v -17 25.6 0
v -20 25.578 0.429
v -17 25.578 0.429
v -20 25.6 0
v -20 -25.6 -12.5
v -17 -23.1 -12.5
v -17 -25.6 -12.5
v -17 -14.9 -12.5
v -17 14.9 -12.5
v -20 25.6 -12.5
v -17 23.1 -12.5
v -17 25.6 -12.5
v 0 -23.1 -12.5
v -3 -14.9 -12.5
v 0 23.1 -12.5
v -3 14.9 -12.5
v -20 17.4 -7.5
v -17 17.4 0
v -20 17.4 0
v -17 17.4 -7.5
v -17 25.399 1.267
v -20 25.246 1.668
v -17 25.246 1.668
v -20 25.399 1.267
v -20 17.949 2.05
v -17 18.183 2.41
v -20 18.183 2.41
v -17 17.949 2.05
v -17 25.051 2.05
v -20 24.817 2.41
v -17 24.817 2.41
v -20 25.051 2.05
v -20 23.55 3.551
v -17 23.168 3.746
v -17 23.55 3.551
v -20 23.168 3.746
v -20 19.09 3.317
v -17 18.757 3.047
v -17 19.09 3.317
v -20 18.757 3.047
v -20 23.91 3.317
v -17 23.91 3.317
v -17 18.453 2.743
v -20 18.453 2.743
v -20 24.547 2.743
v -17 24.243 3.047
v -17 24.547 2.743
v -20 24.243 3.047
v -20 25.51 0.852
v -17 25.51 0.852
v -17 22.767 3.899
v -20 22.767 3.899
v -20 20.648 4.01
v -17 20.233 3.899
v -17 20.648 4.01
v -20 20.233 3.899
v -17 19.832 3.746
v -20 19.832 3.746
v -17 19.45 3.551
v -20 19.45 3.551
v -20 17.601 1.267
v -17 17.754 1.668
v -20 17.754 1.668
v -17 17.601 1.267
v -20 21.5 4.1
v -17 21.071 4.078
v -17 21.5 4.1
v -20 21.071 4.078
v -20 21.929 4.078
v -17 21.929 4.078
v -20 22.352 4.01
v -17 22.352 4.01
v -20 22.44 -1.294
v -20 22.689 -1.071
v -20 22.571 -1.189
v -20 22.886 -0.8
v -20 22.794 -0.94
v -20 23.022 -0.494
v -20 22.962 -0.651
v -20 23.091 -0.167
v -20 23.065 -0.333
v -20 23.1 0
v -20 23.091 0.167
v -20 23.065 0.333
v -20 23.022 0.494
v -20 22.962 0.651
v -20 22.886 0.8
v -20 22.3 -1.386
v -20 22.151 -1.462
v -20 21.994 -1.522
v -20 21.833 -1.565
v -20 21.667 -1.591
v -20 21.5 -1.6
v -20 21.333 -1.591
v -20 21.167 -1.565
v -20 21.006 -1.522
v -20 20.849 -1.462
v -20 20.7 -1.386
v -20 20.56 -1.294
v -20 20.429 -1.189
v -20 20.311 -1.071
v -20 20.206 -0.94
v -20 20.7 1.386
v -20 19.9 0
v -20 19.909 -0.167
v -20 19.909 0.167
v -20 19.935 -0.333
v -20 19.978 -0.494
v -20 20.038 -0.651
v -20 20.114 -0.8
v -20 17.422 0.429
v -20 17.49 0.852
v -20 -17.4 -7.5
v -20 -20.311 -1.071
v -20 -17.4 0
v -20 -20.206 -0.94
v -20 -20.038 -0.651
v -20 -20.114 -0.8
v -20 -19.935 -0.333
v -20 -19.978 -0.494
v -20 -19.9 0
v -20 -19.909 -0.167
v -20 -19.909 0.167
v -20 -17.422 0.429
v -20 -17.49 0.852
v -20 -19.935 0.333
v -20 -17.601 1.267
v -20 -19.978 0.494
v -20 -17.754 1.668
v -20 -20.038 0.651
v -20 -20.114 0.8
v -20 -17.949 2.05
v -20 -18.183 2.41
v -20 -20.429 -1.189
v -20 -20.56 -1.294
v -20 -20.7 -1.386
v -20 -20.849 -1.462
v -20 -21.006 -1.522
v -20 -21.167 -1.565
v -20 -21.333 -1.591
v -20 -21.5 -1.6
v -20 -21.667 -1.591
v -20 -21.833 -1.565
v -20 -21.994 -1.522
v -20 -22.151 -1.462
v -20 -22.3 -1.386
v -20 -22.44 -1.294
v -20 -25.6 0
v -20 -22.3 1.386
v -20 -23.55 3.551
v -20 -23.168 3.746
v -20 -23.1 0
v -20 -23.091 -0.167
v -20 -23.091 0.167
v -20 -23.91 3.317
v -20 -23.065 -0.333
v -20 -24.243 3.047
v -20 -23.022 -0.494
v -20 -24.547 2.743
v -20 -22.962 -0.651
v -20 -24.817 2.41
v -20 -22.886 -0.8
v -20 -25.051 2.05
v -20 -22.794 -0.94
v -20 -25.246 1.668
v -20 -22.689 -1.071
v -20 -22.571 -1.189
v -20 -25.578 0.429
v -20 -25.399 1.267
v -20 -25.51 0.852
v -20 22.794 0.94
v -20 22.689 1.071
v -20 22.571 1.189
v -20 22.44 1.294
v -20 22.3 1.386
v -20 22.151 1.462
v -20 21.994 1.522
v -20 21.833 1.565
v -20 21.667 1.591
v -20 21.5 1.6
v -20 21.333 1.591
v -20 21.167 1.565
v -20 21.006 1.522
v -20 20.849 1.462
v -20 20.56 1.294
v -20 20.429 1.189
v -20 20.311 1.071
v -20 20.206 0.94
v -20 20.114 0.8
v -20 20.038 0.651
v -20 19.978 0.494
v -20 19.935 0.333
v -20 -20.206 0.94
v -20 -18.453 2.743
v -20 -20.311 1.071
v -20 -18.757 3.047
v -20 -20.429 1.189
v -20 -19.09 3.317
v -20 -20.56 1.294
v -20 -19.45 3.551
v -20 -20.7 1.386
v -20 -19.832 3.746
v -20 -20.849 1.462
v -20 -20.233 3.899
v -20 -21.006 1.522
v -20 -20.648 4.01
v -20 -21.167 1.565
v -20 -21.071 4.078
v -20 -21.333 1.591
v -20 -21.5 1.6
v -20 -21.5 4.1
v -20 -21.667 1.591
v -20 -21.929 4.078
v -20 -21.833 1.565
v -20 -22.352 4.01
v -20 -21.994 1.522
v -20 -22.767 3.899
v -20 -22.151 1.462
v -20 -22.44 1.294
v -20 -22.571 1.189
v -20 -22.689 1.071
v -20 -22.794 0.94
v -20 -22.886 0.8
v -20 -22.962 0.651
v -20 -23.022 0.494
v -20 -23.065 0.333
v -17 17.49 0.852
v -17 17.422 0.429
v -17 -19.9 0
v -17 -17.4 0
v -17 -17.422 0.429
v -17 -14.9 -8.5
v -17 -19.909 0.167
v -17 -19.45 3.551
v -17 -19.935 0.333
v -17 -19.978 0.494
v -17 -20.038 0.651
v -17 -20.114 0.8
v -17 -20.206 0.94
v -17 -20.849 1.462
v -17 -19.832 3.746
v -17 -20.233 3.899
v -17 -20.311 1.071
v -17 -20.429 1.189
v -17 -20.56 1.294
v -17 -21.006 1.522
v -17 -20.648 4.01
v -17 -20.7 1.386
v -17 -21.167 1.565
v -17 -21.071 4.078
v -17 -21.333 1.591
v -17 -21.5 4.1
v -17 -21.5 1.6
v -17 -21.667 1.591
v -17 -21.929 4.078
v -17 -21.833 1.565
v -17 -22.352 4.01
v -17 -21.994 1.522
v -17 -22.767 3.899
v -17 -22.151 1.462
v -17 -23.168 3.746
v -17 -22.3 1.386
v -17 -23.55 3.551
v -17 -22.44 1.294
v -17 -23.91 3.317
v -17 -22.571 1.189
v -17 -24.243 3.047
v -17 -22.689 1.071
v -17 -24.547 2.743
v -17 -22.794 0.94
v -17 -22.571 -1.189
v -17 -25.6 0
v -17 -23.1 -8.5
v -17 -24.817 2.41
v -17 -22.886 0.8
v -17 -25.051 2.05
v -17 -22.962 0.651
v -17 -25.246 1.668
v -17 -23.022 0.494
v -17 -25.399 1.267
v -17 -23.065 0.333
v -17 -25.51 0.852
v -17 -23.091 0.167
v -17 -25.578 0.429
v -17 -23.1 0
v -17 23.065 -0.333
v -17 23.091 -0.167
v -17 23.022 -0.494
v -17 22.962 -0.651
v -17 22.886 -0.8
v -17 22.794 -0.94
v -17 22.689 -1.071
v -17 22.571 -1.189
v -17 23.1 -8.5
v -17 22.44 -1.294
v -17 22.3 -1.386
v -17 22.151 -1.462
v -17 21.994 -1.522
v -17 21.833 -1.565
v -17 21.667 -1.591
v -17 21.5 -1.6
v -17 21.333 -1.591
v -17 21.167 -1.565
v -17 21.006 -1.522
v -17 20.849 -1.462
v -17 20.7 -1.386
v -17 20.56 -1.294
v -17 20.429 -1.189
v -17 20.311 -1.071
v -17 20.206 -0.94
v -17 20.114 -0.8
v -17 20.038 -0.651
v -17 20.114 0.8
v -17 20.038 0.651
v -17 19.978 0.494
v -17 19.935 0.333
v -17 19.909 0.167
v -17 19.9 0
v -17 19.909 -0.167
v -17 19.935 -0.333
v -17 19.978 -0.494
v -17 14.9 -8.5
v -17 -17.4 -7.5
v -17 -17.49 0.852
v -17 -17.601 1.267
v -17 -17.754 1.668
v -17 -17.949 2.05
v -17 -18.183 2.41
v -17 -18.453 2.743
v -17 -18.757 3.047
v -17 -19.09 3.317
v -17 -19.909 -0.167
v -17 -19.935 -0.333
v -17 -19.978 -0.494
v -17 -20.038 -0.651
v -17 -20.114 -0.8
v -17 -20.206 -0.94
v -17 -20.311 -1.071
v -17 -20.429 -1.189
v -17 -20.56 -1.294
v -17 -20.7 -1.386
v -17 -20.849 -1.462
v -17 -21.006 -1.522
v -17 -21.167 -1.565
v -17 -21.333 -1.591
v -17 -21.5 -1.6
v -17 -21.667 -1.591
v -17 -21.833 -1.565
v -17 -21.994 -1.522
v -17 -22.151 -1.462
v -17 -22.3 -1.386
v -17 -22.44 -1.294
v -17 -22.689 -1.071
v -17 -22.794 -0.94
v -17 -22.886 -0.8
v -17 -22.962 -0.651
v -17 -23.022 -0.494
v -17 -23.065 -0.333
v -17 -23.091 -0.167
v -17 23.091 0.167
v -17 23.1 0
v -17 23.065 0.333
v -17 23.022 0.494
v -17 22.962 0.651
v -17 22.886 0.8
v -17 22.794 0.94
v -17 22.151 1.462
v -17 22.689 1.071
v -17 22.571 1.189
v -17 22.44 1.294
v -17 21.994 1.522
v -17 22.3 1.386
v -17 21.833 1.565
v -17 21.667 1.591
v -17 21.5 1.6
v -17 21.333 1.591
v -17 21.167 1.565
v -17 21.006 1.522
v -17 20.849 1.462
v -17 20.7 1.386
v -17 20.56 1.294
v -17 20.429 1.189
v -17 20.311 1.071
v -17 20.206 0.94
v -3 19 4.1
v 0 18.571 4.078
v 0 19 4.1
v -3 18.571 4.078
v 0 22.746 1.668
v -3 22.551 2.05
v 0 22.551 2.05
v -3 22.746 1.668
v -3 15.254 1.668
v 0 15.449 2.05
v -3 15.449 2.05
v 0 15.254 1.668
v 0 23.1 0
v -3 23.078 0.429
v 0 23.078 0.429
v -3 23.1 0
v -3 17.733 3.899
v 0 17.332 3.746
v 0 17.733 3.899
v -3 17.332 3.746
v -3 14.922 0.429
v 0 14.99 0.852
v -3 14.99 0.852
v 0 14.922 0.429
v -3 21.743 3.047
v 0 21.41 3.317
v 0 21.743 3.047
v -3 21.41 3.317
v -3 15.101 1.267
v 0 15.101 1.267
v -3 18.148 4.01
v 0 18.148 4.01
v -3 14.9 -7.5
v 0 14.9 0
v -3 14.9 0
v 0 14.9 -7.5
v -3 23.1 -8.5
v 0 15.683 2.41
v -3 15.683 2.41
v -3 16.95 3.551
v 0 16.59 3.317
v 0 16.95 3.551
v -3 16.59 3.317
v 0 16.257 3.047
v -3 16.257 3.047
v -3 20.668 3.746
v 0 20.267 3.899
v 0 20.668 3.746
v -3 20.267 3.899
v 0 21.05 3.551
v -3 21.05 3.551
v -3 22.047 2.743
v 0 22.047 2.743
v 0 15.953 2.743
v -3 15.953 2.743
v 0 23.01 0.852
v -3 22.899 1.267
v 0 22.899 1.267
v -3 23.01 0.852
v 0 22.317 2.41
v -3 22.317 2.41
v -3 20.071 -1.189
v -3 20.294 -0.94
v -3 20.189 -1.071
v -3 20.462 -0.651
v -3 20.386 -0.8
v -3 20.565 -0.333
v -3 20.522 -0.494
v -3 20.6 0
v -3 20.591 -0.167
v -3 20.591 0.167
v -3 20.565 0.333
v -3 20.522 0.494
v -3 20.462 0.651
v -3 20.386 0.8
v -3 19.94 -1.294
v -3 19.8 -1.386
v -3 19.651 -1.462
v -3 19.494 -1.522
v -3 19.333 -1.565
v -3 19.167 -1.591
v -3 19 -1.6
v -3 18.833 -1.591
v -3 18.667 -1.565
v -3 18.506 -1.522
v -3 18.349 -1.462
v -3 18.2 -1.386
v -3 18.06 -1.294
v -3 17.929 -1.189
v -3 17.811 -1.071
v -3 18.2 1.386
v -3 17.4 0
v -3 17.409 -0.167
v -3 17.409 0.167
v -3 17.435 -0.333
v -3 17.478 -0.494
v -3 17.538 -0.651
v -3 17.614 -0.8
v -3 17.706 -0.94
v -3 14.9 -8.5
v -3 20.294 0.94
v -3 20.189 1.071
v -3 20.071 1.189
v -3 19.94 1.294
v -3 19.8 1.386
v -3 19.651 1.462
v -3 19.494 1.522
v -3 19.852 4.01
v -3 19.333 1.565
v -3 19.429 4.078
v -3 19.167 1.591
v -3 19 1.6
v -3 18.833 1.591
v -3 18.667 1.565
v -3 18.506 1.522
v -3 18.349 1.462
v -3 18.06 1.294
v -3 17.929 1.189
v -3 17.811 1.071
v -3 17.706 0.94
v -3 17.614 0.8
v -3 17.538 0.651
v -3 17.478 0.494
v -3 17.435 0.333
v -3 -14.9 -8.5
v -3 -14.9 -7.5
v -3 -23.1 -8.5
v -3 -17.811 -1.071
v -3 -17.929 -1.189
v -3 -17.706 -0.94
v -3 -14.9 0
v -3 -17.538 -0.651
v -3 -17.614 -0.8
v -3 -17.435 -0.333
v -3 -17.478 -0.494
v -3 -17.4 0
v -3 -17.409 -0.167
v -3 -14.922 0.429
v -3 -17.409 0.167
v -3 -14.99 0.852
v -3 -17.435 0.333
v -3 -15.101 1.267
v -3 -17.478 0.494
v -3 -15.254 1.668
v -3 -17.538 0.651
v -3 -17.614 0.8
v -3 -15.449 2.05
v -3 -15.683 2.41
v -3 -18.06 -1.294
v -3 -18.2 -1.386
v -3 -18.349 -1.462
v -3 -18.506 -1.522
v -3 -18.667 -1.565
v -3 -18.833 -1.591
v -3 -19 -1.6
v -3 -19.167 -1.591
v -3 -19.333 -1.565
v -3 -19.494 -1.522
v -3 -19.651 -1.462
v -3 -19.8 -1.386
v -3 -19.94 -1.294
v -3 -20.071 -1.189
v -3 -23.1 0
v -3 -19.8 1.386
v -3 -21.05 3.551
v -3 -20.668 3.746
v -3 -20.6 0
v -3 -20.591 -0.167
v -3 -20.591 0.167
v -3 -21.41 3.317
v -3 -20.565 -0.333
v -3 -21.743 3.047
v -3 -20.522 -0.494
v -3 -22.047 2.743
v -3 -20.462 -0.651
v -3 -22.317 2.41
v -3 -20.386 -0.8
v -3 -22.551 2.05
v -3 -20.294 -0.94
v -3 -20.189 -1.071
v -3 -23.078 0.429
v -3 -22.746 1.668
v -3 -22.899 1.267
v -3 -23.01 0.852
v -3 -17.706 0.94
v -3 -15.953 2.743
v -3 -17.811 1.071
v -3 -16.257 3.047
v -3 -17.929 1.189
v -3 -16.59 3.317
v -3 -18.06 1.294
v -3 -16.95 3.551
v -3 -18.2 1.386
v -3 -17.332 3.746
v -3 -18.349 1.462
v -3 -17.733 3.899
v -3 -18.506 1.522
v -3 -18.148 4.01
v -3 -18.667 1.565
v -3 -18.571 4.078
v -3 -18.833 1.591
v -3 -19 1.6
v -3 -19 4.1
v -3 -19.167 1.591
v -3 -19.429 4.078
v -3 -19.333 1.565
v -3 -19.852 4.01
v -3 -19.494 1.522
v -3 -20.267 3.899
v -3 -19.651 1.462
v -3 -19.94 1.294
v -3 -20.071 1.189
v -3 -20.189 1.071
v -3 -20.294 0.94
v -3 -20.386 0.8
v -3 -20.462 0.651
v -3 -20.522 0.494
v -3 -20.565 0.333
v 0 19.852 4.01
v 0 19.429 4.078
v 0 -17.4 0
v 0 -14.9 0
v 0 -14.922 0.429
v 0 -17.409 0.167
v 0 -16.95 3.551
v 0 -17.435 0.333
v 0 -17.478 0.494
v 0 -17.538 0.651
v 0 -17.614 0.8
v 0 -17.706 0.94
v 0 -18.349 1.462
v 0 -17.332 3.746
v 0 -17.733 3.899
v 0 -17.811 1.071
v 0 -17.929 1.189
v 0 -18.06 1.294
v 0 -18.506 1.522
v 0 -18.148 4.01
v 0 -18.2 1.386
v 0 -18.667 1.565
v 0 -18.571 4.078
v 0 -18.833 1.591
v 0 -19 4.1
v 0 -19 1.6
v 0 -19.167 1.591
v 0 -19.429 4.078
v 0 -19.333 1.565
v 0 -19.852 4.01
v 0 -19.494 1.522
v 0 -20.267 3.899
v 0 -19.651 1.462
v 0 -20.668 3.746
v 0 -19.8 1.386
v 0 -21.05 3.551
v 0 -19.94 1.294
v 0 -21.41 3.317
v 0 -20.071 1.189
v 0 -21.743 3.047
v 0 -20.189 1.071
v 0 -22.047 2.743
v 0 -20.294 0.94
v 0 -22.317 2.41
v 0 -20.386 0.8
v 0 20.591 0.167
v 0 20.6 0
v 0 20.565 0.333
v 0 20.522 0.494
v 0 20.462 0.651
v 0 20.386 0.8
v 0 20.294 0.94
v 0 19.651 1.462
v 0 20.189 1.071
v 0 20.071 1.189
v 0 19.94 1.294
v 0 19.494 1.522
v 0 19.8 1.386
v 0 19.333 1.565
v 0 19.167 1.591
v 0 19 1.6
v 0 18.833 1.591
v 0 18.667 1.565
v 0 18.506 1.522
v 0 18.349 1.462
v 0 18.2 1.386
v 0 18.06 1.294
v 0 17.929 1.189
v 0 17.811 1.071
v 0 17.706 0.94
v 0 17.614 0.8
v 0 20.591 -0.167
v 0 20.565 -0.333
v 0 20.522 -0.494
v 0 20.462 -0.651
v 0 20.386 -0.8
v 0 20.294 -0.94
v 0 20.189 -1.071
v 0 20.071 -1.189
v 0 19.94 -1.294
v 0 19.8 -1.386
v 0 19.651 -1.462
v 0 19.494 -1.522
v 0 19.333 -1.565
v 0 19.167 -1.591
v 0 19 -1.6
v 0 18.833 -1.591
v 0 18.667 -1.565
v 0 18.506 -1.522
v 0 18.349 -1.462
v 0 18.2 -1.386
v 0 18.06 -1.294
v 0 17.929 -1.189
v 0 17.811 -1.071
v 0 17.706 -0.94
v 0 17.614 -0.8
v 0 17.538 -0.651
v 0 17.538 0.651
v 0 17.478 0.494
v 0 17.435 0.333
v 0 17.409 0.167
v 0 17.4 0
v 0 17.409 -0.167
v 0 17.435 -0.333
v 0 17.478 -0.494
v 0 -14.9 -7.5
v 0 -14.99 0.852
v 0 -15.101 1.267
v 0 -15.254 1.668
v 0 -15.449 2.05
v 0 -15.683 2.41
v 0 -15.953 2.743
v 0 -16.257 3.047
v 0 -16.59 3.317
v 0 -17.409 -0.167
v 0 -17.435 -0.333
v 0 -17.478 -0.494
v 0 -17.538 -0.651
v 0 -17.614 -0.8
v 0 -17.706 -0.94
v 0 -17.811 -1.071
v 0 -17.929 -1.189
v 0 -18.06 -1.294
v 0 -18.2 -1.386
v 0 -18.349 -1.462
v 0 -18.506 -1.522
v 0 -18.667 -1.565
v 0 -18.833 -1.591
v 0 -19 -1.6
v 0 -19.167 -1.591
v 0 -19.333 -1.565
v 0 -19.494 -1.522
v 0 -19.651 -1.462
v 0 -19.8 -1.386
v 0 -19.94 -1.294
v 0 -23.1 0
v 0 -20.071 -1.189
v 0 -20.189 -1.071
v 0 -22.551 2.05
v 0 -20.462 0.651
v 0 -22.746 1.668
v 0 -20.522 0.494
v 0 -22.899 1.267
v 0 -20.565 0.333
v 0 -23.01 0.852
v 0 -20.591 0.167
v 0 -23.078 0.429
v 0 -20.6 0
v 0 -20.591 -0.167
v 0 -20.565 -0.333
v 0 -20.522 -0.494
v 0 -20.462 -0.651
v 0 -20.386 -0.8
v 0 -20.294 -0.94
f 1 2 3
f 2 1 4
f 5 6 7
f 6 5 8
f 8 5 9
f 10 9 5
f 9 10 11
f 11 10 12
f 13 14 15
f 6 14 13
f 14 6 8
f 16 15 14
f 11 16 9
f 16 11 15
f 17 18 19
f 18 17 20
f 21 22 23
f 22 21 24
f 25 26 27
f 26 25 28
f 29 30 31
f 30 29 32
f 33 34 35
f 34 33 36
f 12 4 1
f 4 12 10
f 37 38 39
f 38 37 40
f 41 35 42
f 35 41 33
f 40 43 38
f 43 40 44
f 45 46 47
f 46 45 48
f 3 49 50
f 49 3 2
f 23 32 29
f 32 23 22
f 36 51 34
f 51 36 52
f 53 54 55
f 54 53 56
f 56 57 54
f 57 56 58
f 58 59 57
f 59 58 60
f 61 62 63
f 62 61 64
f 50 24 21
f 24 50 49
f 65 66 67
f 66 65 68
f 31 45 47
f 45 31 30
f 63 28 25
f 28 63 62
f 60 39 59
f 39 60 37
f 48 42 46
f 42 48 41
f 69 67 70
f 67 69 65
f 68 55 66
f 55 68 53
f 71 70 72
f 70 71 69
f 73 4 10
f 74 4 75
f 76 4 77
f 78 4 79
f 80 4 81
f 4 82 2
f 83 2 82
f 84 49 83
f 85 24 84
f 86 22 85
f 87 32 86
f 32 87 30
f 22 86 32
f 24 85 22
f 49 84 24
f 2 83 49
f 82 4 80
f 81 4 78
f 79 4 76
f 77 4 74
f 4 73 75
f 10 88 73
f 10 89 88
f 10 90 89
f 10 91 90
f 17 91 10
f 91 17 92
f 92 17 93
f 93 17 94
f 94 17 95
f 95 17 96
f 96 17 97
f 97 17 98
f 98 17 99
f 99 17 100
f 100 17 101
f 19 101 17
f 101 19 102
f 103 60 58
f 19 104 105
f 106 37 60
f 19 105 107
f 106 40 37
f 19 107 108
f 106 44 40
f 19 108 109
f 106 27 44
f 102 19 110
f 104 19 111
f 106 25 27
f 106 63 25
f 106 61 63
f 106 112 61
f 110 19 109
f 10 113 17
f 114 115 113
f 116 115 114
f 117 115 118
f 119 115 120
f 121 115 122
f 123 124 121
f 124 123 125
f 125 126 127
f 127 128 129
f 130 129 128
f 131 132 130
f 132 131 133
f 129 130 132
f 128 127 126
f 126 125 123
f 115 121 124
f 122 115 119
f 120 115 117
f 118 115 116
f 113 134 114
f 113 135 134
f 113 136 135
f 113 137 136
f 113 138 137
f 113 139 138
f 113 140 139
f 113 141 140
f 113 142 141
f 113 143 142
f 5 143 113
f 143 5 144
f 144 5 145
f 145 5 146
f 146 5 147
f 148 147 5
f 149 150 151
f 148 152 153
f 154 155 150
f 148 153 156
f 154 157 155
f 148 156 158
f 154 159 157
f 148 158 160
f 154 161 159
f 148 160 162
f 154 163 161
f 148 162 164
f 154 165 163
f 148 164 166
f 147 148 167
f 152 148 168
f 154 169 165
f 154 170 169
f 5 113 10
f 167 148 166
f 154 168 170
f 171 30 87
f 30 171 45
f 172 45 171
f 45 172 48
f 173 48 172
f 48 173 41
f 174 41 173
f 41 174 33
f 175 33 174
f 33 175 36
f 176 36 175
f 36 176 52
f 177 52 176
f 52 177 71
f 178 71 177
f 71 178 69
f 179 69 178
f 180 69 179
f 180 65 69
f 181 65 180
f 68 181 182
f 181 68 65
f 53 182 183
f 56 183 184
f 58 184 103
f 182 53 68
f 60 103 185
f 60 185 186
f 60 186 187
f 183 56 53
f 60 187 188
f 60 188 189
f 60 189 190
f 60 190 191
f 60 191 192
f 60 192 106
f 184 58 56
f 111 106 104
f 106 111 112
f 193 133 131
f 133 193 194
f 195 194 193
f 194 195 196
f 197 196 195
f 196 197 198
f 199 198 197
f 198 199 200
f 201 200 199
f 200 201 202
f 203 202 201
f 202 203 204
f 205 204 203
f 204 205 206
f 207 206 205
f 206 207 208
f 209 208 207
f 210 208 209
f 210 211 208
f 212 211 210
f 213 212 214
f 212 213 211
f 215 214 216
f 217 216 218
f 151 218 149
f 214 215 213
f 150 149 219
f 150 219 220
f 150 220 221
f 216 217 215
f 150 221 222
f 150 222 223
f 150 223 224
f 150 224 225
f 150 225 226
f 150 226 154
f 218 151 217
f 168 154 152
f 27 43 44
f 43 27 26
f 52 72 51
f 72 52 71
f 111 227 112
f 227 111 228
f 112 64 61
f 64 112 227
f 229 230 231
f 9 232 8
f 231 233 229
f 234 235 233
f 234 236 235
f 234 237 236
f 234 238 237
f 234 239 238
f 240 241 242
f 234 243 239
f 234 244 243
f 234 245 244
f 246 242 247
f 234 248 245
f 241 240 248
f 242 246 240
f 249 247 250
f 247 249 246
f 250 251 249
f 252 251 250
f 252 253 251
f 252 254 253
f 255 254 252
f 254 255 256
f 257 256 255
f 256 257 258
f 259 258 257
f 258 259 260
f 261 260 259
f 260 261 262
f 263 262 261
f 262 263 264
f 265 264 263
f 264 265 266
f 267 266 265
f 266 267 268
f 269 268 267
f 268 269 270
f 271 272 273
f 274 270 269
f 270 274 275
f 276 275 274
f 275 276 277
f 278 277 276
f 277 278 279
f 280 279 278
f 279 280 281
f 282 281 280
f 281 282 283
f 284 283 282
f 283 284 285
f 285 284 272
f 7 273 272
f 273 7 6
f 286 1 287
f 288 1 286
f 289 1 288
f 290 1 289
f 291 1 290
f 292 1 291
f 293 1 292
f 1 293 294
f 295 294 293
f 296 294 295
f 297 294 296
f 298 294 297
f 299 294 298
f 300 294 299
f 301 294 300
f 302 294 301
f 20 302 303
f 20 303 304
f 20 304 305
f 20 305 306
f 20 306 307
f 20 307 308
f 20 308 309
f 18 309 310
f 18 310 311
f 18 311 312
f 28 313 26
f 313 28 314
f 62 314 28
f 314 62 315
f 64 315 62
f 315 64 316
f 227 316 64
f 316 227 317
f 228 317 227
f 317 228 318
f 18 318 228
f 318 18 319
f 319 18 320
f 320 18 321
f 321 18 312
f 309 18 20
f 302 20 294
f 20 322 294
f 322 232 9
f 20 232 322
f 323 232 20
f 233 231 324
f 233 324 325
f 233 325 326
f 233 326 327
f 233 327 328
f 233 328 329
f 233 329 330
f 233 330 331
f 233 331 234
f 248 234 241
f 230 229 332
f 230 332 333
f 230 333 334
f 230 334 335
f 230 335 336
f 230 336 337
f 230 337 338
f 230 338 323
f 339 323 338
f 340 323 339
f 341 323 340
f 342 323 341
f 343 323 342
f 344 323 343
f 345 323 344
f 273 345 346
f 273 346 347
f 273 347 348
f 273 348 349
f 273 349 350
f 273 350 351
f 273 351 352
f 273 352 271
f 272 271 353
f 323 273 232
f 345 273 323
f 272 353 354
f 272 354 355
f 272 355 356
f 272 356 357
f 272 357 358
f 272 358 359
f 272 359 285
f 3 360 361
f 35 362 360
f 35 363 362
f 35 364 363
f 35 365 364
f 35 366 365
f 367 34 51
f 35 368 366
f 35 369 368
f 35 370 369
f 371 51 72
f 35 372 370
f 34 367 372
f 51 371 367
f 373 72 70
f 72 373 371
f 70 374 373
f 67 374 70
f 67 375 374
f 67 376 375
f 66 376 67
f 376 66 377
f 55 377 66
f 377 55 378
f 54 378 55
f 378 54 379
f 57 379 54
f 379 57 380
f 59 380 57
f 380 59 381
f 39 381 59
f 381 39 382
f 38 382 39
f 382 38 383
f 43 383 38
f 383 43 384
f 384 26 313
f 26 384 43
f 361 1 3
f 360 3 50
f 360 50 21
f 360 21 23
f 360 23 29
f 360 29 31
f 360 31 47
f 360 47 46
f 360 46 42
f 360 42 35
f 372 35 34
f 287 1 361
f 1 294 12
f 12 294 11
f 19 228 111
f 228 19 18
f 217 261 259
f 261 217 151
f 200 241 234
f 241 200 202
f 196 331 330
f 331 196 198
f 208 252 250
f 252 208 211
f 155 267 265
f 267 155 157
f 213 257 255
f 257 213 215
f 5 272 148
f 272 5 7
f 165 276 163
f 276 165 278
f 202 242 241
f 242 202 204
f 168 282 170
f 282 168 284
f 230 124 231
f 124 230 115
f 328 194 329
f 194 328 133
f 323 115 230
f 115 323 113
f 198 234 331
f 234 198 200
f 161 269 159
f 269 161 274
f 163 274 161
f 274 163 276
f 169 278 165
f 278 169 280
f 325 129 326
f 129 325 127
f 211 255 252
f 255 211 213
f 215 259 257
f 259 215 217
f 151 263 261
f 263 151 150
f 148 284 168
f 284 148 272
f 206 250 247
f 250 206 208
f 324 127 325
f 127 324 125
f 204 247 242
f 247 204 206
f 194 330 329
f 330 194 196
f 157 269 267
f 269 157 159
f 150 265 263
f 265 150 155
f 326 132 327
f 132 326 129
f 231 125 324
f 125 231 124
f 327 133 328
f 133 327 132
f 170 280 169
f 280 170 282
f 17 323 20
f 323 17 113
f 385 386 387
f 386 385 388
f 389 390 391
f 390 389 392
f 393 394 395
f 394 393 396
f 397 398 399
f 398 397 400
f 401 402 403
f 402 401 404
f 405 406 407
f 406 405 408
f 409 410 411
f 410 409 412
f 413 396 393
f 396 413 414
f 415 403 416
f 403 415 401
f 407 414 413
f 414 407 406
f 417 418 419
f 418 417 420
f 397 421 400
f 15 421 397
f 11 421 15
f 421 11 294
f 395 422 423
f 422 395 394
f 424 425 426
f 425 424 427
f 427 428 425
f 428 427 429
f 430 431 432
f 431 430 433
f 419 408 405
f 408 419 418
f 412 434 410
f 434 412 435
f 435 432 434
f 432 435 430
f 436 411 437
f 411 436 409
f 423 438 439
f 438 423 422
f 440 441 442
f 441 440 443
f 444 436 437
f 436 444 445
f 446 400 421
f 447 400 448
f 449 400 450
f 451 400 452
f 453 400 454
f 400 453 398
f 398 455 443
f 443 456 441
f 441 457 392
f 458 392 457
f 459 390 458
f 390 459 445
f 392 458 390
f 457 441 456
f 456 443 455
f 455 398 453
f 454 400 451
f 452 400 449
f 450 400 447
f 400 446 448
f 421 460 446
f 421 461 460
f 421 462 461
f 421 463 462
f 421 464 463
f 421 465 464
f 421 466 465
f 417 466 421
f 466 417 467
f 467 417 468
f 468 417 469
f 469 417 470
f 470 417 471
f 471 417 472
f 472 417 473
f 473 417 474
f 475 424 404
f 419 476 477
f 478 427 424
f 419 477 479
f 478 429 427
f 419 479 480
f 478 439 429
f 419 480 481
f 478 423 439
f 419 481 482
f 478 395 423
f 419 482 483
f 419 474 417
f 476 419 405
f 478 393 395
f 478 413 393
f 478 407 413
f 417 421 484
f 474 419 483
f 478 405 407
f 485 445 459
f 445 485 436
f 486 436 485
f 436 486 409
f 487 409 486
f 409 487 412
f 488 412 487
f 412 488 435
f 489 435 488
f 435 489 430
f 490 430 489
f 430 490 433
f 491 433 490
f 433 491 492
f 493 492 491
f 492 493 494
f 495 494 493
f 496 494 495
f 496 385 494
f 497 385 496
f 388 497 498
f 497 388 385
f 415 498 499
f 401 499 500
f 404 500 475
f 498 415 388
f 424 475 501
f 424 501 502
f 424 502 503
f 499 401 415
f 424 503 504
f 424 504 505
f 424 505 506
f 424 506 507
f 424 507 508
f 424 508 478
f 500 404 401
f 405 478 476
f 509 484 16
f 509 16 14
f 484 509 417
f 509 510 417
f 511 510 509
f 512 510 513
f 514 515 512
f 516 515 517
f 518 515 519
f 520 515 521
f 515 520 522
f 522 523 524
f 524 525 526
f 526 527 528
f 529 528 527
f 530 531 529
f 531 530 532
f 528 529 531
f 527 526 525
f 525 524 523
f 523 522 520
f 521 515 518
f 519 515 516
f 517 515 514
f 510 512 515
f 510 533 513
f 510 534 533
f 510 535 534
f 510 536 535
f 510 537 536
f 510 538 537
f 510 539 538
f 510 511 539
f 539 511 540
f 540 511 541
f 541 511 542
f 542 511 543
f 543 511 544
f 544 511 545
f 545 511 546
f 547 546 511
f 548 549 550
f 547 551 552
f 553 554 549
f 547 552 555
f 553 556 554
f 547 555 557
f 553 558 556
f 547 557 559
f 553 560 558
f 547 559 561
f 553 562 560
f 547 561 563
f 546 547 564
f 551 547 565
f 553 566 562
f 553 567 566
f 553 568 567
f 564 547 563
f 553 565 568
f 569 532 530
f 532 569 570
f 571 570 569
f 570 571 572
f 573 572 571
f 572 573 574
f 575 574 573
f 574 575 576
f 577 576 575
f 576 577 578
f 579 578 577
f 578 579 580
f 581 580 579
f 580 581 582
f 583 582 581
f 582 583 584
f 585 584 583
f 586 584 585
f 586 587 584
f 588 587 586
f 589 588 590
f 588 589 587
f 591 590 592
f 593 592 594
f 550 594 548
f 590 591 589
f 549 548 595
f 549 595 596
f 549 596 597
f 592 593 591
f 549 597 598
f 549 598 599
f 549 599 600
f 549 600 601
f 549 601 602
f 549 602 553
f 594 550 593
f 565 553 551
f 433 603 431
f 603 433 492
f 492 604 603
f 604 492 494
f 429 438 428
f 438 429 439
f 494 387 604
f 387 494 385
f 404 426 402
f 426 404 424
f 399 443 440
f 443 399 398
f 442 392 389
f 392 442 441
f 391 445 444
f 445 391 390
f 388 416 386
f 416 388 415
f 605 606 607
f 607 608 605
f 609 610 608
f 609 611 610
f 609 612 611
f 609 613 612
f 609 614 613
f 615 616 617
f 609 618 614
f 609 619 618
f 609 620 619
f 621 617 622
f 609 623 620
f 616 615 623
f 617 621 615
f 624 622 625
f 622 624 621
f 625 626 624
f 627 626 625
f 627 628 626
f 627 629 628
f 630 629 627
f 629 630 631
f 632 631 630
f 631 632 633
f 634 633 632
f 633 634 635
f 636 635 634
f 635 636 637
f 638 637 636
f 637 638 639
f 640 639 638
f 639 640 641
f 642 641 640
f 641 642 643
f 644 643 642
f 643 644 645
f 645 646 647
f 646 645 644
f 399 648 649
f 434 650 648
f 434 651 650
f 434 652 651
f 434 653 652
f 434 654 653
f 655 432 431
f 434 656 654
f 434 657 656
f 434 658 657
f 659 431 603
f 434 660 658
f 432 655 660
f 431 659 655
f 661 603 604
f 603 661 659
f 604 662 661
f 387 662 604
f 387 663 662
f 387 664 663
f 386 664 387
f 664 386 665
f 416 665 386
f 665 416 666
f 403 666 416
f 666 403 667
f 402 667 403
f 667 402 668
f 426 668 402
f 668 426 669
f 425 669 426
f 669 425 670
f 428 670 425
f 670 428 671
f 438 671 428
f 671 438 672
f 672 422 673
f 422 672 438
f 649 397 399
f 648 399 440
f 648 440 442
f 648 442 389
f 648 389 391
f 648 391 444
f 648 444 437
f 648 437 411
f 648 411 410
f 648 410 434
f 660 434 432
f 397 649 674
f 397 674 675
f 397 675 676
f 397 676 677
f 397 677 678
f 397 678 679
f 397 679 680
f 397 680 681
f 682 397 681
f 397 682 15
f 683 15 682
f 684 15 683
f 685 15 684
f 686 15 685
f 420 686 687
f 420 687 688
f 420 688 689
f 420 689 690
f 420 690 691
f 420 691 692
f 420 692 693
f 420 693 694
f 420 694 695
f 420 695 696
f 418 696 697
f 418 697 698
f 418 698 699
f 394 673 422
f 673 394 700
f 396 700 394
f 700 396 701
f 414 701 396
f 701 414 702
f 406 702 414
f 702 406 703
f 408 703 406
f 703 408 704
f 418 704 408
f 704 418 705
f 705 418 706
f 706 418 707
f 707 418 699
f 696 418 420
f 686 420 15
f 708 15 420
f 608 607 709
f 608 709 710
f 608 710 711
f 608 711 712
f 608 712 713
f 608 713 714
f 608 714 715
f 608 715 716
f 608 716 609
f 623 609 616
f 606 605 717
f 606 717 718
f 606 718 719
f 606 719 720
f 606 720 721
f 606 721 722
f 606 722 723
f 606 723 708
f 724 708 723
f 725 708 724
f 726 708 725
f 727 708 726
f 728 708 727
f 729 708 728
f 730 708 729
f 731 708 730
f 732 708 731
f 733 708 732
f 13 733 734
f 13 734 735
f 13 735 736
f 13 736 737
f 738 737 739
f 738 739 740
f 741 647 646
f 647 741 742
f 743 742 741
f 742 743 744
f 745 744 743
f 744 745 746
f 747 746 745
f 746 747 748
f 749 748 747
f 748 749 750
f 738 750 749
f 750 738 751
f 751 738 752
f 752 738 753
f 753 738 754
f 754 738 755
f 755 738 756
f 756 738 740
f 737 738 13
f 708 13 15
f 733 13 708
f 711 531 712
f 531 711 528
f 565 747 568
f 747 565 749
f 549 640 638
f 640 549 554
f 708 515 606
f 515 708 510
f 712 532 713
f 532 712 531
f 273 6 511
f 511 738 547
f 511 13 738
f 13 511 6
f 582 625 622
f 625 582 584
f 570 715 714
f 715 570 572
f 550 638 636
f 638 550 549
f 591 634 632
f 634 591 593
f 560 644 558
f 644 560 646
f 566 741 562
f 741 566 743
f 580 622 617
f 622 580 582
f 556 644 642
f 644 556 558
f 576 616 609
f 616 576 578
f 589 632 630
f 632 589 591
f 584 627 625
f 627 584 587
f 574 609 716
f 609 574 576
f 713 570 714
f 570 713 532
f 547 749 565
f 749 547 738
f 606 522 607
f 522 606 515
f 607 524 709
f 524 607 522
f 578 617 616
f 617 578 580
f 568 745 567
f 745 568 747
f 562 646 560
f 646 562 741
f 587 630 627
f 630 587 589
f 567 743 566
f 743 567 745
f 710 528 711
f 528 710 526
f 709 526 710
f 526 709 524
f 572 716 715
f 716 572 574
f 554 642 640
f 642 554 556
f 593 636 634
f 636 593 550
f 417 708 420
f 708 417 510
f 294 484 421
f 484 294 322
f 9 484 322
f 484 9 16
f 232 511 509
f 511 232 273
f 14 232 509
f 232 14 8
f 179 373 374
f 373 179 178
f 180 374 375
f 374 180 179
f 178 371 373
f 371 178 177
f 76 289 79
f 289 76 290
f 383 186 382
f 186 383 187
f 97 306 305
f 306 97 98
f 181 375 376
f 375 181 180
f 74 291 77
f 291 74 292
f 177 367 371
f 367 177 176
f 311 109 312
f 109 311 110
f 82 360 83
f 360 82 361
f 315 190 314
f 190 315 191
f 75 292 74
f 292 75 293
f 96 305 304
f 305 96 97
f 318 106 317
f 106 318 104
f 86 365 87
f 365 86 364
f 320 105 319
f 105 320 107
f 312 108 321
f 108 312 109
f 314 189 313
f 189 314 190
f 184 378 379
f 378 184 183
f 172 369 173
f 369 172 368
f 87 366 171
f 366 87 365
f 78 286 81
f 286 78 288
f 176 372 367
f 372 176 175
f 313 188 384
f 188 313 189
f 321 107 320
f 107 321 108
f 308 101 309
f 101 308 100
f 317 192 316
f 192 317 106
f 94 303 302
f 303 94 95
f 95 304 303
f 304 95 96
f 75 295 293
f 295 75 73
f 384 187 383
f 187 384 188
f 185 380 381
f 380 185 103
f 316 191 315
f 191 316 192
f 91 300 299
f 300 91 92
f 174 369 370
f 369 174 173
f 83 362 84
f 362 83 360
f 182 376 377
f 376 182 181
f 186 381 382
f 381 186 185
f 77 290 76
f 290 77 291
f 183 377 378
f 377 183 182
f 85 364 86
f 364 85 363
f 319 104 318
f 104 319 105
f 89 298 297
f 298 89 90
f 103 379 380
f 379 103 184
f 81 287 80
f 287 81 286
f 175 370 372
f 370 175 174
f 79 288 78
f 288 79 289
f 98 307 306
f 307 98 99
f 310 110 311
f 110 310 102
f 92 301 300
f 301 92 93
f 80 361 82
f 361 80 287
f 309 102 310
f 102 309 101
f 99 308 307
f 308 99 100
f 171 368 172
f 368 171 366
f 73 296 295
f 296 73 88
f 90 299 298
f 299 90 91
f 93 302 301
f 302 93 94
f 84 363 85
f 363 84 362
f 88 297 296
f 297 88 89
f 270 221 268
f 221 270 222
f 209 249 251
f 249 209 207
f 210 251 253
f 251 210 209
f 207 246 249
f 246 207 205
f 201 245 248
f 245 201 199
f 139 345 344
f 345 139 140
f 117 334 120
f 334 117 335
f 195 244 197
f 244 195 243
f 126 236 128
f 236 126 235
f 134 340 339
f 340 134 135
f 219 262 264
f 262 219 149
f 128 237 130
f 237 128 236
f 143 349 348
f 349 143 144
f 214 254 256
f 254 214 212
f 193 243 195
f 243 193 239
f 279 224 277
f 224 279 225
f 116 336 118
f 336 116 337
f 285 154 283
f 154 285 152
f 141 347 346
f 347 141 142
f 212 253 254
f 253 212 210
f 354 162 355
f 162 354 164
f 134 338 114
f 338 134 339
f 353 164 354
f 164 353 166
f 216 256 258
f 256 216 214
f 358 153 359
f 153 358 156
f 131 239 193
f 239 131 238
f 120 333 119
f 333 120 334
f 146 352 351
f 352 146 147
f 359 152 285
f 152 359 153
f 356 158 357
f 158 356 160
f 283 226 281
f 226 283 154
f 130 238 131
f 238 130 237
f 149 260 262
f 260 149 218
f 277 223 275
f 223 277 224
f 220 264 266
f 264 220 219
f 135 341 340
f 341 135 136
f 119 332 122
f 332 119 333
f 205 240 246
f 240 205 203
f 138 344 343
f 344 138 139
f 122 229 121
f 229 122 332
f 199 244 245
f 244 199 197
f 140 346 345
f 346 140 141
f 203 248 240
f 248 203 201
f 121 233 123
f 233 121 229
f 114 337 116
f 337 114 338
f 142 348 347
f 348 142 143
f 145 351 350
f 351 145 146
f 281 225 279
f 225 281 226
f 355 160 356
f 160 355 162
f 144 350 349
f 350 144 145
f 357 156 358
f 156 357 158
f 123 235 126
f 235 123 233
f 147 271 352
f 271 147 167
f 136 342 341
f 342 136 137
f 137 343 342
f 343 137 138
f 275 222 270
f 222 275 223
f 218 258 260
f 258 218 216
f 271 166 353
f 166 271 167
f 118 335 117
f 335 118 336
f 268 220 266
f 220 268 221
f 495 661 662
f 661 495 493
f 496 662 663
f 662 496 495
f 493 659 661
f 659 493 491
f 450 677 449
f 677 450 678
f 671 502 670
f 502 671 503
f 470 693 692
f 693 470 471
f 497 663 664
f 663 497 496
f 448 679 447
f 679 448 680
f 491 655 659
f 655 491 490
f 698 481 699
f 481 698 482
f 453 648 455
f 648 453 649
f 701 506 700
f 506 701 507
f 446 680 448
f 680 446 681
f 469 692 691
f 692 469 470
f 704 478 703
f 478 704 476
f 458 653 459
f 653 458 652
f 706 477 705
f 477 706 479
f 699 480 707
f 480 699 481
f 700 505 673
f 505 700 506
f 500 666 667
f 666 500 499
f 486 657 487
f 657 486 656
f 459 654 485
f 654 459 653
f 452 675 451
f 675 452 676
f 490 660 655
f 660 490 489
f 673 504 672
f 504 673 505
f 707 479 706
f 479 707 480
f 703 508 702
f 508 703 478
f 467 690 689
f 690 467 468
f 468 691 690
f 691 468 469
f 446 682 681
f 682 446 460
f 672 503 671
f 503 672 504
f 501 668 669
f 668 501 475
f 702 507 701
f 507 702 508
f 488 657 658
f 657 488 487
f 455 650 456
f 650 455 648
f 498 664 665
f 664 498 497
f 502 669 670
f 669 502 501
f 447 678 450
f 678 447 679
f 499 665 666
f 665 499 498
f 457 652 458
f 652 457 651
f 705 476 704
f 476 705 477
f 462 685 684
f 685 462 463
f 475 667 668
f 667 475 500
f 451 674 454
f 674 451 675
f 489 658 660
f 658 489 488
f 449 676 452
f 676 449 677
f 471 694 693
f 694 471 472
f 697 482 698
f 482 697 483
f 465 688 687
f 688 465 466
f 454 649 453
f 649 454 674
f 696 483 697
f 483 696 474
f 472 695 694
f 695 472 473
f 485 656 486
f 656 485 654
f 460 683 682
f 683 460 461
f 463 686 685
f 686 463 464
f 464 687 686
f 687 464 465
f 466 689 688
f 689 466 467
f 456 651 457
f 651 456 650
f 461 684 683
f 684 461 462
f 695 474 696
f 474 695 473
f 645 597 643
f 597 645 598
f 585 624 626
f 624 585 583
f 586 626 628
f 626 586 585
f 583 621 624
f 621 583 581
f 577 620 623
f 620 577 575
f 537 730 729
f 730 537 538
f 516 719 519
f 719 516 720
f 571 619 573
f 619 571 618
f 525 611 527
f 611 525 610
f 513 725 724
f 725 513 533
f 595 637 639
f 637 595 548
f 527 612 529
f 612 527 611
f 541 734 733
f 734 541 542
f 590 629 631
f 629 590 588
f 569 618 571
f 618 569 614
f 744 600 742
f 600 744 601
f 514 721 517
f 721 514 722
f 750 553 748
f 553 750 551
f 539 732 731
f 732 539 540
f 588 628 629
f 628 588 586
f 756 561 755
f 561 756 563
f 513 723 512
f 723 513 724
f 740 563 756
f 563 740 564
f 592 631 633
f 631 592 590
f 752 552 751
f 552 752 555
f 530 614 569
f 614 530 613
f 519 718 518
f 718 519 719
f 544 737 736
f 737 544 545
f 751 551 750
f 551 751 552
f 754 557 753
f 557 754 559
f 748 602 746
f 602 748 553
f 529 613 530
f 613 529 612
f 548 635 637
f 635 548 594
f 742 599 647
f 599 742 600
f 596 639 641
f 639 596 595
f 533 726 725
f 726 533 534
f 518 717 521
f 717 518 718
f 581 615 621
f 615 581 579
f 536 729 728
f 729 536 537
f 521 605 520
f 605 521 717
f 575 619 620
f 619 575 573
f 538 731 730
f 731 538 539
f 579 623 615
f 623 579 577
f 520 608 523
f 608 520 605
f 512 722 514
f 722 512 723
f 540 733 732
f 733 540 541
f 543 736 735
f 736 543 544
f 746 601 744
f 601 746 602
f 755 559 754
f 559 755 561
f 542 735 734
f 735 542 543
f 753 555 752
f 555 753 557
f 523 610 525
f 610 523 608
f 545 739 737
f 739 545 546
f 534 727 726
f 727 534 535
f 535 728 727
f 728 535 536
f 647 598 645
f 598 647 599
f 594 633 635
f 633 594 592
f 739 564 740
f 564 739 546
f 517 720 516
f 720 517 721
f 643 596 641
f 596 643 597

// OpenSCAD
$fn = 60;

screwDiameter = 3.2;
screwRadius = screwDiameter/2;

screwMountWall = 2.5;

screwMountRadius = screwRadius+screwMountWall;

mountPlateHeigh = 3;

totalHeight = 20;


// topPCB dimations
PCB_top_width = 43;
PCB_top_length = 42;

// bottomPCB dimations
PCB_bottom_width = 38;
PCB_bottom_length = 51;

// offset
offset = PCB_bottom_length-PCB_top_length;
offset = 0;
bottomOffset = 7;

bottomOffset = 10;



rotate([0,-90,0])
difference() {
	union() {
		translate([-bottomOffset-0.5,PCB_bottom_width/2,totalHeight/2])
		cube(size=[4,screwMountRadius*2,totalHeight],center=true);

		translate([-bottomOffset-0.5,-PCB_bottom_width/2,totalHeight/2])
		cube(size=[4,screwMountRadius*2,totalHeight],center=true);


		union() {
			hull() {
				translate([offset,PCB_top_width/2,totalHeight-mountPlateHeigh])
				cylinder(r=screwMountRadius,h=mountPlateHeigh);
				translate([-bottomOffset,PCB_top_width/2,mountPlateHeigh/2+(totalHeight-mountPlateHeigh)])
				cube(size=[5,screwMountRadius*2,mountPlateHeigh],center=true);	
			}

			hull() {
				translate([offset,-PCB_top_width/2,totalHeight-mountPlateHeigh])
				cylinder(r=screwMountRadius,h=mountPlateHeigh);
				translate([-bottomOffset,-PCB_top_width/2,mountPlateHeigh/2+(totalHeight-mountPlateHeigh)])
				cube(size=[5,screwMountRadius*2,mountPlateHeigh],center=true);
			}

			hull() {
				translate([-bottomOffset,PCB_top_width/2,mountPlateHeigh/2+(totalHeight-mountPlateHeigh)])
				cube(size=[5,screwMountRadius*2,mountPlateHeigh],center=true);
				translate([-bottomOffset,-PCB_top_width/2,mountPlateHeigh/2+(totalHeight-mountPlateHeigh)])
				cube(size=[5,screwMountRadius*2,mountPlateHeigh],center=true);	
			}
		}


		union() {
			hull() {
				translate([-bottomOffset,PCB_bottom_width/2,mountPlateHeigh/2])
				cube(size=[5,screwMountRadius*2,mountPlateHeigh],center=true);
				translate([0,PCB_bottom_width/2,0])
				cylinder(r=screwMountRadius,h=mountPlateHeigh);
			}

			hull() {
				translate([-bottomOffset,-PCB_bottom_width/2,mountPlateHeigh/2])
				cube(size=[5,screwMountRadius*2,mountPlateHeigh],center=true);
				translate([0,-PCB_bottom_width/2,0])
				cylinder(r=screwMountRadius,h=mountPlateHeigh);
			}

			hull() {
				translate([-bottomOffset,PCB_bottom_width/2,mountPlateHeigh/2])
				cube(size=[5,screwMountRadius*2,mountPlateHeigh],center=true);
				translate([-bottomOffset,-PCB_bottom_width/2,mountPlateHeigh/2])
				cube(size=[5,screwMountRadius*2,mountPlateHeigh],center=true);
			}	
		}
	}




	union() {
		// bottom front screwholes
		translate([0,PCB_bottom_width/2,-0.5])
		cylinder(r=screwRadius,h=mountPlateHeigh+1);
		translate([0,-PCB_bottom_width/2,-0.5])
		cylinder(r=screwRadius,h=mountPlateHeigh+1);

		// top front screwholes
		translate([offset,0,totalHeight-mountPlateHeigh]) {
			translate([0,PCB_top_width/2,-0.5])
			cylinder(r=screwRadius,h=mountPlateHeigh+1);
			translate([0,-PCB_top_width/2,-0.5])
			cylinder(r=screwRadius,h=mountPlateHeigh+1);
		}
	}
}
